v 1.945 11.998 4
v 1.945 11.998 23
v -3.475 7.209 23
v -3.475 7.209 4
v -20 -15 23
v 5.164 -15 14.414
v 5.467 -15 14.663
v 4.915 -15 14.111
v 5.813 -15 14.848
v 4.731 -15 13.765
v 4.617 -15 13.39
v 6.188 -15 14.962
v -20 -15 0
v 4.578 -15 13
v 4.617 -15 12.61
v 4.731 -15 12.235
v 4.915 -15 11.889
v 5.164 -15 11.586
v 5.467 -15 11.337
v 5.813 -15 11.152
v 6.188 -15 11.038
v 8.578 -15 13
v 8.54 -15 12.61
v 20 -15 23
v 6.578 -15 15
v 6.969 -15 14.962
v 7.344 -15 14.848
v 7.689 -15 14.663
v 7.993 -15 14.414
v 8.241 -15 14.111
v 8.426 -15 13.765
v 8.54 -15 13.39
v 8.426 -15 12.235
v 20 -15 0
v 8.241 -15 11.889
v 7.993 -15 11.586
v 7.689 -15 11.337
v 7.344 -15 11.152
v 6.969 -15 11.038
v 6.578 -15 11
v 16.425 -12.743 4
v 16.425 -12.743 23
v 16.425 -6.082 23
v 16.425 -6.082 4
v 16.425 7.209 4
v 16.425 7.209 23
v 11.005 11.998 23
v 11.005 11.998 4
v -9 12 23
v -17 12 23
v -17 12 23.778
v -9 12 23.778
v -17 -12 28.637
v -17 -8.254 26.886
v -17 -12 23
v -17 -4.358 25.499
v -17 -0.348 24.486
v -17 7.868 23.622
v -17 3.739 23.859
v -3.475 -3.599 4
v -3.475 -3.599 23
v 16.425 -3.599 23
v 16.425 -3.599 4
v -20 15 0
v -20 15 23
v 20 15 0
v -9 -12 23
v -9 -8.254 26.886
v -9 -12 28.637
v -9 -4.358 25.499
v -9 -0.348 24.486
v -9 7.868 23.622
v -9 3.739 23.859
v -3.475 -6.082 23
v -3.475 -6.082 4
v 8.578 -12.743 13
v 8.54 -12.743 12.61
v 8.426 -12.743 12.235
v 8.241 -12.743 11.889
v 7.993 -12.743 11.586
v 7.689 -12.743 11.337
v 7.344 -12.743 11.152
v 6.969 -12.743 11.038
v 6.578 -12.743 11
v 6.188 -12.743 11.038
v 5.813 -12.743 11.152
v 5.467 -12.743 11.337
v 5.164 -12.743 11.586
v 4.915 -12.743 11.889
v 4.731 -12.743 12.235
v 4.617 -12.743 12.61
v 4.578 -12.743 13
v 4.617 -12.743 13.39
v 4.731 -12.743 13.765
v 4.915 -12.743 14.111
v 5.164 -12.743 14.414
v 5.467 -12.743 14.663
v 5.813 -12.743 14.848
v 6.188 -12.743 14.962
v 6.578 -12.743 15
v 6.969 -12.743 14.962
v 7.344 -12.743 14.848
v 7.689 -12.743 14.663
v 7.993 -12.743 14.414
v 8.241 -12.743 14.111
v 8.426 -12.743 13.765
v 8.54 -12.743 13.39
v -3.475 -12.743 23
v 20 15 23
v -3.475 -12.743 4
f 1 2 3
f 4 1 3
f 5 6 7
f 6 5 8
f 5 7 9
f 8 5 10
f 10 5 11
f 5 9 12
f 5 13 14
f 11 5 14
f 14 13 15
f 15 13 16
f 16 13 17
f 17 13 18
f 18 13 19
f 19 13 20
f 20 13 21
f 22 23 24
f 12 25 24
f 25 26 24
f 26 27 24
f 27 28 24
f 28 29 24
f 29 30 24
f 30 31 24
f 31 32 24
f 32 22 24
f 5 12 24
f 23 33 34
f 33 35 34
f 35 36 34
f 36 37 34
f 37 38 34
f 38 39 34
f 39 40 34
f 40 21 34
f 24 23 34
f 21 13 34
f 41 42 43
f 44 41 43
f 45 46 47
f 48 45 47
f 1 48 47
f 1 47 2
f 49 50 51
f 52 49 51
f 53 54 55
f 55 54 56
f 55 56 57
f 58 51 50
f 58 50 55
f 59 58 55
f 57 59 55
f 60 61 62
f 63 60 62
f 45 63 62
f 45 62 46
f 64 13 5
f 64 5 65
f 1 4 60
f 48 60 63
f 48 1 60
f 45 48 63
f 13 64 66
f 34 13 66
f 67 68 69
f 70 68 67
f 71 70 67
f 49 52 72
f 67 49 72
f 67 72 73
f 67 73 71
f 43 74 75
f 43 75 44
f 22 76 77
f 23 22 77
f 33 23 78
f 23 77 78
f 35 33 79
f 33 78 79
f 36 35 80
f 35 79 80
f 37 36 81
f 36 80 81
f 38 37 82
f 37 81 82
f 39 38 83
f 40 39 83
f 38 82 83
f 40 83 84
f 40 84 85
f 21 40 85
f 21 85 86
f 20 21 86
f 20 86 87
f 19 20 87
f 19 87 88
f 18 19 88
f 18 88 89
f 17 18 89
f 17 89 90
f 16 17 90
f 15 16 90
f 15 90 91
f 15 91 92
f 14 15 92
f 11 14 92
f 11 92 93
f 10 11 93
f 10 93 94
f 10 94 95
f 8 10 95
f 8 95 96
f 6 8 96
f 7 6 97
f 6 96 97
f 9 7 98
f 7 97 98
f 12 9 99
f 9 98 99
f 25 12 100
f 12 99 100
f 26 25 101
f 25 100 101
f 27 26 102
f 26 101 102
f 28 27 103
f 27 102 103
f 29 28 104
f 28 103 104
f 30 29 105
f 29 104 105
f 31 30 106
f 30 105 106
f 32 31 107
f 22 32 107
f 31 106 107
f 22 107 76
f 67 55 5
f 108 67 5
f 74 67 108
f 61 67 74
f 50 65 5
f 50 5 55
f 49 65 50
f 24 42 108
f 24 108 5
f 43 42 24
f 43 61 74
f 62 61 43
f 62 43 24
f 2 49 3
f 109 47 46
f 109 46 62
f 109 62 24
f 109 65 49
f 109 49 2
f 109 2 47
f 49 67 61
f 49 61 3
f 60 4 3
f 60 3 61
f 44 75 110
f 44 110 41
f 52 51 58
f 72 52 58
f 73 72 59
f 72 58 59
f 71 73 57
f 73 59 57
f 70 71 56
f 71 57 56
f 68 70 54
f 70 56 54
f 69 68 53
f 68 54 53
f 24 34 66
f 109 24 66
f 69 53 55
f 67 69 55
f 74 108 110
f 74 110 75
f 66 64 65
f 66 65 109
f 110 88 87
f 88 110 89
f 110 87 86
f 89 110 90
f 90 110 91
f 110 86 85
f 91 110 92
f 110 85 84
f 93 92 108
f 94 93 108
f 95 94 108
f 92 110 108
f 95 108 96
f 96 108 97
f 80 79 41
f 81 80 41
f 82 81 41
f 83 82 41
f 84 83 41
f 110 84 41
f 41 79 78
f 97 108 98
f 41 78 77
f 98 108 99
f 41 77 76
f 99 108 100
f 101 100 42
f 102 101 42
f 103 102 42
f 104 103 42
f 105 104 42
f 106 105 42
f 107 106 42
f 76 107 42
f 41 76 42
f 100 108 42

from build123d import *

# Parameters (mm, degrees)
SKETCH1_W           = 40
SKETCH1_H           = 30
BOSS_EXTRUDE1_DEPTH = 23
SKETCH2_W           = 19.900467999
SKETCH2_H           = 6.66107141
CUT_EXTRUDE1_DEPTH  = 19
SKETCH3_R           = 2
CUT_EXTRUDE2_DEPTH  = 19
BOSS_EXTRUDE2_DEPTH = 8


with BuildPart() as part:
    # Sketch1 → Boss-Extrude1 (new body)
    with BuildSketch(Plane.XY):
        Rectangle(SKETCH1_W, SKETCH1_H)
    extrude(amount=BOSS_EXTRUDE1_DEPTH)

    # Sketch2 → Cut-Extrude1 (cut)
    with BuildSketch(Plane.XY.offset(23)):
        Polygon((-3.475341605, 7.20854355), (-3.475341605, -3.599460948), (16.425126394, -3.599460948), (16.425126394, 7.20854355), (11.005248415, 11.99820316), (1.944536374, 11.99820316), align=None)
        with Locations((6.474892394, -9.412383513)):
            Rectangle(SKETCH2_W, SKETCH2_H)
    extrude(amount=-CUT_EXTRUDE1_DEPTH, mode=Mode.SUBTRACT)

    # Sketch3 → Cut-Extrude2 (cut)
    with BuildSketch(Plane(origin=(0, -12.742919218, 0), x_dir=(1, 0, 0), z_dir=(0, 1, 0))):
        with Locations((6.578325181, -13)):
            Circle(SKETCH3_R)
    extrude(amount=-CUT_EXTRUDE2_DEPTH, mode=Mode.SUBTRACT)

    # Sketch4 → Boss-Extrude2 (add)
    with BuildSketch(Plane.ZY.offset(17)):
        with BuildLine():
            Line((23, 12), (23.778195764, 12))
            ThreePointArc((23.778195764, 12), (24.486476148, -0.348459209), (28.637102986, -12))
            Line((28.637102986, -12), (23, -12))
            Line((23, -12), (23, 12))
        make_face()
    extrude(amount=-BOSS_EXTRUDE2_DEPTH)


solid = part.part
